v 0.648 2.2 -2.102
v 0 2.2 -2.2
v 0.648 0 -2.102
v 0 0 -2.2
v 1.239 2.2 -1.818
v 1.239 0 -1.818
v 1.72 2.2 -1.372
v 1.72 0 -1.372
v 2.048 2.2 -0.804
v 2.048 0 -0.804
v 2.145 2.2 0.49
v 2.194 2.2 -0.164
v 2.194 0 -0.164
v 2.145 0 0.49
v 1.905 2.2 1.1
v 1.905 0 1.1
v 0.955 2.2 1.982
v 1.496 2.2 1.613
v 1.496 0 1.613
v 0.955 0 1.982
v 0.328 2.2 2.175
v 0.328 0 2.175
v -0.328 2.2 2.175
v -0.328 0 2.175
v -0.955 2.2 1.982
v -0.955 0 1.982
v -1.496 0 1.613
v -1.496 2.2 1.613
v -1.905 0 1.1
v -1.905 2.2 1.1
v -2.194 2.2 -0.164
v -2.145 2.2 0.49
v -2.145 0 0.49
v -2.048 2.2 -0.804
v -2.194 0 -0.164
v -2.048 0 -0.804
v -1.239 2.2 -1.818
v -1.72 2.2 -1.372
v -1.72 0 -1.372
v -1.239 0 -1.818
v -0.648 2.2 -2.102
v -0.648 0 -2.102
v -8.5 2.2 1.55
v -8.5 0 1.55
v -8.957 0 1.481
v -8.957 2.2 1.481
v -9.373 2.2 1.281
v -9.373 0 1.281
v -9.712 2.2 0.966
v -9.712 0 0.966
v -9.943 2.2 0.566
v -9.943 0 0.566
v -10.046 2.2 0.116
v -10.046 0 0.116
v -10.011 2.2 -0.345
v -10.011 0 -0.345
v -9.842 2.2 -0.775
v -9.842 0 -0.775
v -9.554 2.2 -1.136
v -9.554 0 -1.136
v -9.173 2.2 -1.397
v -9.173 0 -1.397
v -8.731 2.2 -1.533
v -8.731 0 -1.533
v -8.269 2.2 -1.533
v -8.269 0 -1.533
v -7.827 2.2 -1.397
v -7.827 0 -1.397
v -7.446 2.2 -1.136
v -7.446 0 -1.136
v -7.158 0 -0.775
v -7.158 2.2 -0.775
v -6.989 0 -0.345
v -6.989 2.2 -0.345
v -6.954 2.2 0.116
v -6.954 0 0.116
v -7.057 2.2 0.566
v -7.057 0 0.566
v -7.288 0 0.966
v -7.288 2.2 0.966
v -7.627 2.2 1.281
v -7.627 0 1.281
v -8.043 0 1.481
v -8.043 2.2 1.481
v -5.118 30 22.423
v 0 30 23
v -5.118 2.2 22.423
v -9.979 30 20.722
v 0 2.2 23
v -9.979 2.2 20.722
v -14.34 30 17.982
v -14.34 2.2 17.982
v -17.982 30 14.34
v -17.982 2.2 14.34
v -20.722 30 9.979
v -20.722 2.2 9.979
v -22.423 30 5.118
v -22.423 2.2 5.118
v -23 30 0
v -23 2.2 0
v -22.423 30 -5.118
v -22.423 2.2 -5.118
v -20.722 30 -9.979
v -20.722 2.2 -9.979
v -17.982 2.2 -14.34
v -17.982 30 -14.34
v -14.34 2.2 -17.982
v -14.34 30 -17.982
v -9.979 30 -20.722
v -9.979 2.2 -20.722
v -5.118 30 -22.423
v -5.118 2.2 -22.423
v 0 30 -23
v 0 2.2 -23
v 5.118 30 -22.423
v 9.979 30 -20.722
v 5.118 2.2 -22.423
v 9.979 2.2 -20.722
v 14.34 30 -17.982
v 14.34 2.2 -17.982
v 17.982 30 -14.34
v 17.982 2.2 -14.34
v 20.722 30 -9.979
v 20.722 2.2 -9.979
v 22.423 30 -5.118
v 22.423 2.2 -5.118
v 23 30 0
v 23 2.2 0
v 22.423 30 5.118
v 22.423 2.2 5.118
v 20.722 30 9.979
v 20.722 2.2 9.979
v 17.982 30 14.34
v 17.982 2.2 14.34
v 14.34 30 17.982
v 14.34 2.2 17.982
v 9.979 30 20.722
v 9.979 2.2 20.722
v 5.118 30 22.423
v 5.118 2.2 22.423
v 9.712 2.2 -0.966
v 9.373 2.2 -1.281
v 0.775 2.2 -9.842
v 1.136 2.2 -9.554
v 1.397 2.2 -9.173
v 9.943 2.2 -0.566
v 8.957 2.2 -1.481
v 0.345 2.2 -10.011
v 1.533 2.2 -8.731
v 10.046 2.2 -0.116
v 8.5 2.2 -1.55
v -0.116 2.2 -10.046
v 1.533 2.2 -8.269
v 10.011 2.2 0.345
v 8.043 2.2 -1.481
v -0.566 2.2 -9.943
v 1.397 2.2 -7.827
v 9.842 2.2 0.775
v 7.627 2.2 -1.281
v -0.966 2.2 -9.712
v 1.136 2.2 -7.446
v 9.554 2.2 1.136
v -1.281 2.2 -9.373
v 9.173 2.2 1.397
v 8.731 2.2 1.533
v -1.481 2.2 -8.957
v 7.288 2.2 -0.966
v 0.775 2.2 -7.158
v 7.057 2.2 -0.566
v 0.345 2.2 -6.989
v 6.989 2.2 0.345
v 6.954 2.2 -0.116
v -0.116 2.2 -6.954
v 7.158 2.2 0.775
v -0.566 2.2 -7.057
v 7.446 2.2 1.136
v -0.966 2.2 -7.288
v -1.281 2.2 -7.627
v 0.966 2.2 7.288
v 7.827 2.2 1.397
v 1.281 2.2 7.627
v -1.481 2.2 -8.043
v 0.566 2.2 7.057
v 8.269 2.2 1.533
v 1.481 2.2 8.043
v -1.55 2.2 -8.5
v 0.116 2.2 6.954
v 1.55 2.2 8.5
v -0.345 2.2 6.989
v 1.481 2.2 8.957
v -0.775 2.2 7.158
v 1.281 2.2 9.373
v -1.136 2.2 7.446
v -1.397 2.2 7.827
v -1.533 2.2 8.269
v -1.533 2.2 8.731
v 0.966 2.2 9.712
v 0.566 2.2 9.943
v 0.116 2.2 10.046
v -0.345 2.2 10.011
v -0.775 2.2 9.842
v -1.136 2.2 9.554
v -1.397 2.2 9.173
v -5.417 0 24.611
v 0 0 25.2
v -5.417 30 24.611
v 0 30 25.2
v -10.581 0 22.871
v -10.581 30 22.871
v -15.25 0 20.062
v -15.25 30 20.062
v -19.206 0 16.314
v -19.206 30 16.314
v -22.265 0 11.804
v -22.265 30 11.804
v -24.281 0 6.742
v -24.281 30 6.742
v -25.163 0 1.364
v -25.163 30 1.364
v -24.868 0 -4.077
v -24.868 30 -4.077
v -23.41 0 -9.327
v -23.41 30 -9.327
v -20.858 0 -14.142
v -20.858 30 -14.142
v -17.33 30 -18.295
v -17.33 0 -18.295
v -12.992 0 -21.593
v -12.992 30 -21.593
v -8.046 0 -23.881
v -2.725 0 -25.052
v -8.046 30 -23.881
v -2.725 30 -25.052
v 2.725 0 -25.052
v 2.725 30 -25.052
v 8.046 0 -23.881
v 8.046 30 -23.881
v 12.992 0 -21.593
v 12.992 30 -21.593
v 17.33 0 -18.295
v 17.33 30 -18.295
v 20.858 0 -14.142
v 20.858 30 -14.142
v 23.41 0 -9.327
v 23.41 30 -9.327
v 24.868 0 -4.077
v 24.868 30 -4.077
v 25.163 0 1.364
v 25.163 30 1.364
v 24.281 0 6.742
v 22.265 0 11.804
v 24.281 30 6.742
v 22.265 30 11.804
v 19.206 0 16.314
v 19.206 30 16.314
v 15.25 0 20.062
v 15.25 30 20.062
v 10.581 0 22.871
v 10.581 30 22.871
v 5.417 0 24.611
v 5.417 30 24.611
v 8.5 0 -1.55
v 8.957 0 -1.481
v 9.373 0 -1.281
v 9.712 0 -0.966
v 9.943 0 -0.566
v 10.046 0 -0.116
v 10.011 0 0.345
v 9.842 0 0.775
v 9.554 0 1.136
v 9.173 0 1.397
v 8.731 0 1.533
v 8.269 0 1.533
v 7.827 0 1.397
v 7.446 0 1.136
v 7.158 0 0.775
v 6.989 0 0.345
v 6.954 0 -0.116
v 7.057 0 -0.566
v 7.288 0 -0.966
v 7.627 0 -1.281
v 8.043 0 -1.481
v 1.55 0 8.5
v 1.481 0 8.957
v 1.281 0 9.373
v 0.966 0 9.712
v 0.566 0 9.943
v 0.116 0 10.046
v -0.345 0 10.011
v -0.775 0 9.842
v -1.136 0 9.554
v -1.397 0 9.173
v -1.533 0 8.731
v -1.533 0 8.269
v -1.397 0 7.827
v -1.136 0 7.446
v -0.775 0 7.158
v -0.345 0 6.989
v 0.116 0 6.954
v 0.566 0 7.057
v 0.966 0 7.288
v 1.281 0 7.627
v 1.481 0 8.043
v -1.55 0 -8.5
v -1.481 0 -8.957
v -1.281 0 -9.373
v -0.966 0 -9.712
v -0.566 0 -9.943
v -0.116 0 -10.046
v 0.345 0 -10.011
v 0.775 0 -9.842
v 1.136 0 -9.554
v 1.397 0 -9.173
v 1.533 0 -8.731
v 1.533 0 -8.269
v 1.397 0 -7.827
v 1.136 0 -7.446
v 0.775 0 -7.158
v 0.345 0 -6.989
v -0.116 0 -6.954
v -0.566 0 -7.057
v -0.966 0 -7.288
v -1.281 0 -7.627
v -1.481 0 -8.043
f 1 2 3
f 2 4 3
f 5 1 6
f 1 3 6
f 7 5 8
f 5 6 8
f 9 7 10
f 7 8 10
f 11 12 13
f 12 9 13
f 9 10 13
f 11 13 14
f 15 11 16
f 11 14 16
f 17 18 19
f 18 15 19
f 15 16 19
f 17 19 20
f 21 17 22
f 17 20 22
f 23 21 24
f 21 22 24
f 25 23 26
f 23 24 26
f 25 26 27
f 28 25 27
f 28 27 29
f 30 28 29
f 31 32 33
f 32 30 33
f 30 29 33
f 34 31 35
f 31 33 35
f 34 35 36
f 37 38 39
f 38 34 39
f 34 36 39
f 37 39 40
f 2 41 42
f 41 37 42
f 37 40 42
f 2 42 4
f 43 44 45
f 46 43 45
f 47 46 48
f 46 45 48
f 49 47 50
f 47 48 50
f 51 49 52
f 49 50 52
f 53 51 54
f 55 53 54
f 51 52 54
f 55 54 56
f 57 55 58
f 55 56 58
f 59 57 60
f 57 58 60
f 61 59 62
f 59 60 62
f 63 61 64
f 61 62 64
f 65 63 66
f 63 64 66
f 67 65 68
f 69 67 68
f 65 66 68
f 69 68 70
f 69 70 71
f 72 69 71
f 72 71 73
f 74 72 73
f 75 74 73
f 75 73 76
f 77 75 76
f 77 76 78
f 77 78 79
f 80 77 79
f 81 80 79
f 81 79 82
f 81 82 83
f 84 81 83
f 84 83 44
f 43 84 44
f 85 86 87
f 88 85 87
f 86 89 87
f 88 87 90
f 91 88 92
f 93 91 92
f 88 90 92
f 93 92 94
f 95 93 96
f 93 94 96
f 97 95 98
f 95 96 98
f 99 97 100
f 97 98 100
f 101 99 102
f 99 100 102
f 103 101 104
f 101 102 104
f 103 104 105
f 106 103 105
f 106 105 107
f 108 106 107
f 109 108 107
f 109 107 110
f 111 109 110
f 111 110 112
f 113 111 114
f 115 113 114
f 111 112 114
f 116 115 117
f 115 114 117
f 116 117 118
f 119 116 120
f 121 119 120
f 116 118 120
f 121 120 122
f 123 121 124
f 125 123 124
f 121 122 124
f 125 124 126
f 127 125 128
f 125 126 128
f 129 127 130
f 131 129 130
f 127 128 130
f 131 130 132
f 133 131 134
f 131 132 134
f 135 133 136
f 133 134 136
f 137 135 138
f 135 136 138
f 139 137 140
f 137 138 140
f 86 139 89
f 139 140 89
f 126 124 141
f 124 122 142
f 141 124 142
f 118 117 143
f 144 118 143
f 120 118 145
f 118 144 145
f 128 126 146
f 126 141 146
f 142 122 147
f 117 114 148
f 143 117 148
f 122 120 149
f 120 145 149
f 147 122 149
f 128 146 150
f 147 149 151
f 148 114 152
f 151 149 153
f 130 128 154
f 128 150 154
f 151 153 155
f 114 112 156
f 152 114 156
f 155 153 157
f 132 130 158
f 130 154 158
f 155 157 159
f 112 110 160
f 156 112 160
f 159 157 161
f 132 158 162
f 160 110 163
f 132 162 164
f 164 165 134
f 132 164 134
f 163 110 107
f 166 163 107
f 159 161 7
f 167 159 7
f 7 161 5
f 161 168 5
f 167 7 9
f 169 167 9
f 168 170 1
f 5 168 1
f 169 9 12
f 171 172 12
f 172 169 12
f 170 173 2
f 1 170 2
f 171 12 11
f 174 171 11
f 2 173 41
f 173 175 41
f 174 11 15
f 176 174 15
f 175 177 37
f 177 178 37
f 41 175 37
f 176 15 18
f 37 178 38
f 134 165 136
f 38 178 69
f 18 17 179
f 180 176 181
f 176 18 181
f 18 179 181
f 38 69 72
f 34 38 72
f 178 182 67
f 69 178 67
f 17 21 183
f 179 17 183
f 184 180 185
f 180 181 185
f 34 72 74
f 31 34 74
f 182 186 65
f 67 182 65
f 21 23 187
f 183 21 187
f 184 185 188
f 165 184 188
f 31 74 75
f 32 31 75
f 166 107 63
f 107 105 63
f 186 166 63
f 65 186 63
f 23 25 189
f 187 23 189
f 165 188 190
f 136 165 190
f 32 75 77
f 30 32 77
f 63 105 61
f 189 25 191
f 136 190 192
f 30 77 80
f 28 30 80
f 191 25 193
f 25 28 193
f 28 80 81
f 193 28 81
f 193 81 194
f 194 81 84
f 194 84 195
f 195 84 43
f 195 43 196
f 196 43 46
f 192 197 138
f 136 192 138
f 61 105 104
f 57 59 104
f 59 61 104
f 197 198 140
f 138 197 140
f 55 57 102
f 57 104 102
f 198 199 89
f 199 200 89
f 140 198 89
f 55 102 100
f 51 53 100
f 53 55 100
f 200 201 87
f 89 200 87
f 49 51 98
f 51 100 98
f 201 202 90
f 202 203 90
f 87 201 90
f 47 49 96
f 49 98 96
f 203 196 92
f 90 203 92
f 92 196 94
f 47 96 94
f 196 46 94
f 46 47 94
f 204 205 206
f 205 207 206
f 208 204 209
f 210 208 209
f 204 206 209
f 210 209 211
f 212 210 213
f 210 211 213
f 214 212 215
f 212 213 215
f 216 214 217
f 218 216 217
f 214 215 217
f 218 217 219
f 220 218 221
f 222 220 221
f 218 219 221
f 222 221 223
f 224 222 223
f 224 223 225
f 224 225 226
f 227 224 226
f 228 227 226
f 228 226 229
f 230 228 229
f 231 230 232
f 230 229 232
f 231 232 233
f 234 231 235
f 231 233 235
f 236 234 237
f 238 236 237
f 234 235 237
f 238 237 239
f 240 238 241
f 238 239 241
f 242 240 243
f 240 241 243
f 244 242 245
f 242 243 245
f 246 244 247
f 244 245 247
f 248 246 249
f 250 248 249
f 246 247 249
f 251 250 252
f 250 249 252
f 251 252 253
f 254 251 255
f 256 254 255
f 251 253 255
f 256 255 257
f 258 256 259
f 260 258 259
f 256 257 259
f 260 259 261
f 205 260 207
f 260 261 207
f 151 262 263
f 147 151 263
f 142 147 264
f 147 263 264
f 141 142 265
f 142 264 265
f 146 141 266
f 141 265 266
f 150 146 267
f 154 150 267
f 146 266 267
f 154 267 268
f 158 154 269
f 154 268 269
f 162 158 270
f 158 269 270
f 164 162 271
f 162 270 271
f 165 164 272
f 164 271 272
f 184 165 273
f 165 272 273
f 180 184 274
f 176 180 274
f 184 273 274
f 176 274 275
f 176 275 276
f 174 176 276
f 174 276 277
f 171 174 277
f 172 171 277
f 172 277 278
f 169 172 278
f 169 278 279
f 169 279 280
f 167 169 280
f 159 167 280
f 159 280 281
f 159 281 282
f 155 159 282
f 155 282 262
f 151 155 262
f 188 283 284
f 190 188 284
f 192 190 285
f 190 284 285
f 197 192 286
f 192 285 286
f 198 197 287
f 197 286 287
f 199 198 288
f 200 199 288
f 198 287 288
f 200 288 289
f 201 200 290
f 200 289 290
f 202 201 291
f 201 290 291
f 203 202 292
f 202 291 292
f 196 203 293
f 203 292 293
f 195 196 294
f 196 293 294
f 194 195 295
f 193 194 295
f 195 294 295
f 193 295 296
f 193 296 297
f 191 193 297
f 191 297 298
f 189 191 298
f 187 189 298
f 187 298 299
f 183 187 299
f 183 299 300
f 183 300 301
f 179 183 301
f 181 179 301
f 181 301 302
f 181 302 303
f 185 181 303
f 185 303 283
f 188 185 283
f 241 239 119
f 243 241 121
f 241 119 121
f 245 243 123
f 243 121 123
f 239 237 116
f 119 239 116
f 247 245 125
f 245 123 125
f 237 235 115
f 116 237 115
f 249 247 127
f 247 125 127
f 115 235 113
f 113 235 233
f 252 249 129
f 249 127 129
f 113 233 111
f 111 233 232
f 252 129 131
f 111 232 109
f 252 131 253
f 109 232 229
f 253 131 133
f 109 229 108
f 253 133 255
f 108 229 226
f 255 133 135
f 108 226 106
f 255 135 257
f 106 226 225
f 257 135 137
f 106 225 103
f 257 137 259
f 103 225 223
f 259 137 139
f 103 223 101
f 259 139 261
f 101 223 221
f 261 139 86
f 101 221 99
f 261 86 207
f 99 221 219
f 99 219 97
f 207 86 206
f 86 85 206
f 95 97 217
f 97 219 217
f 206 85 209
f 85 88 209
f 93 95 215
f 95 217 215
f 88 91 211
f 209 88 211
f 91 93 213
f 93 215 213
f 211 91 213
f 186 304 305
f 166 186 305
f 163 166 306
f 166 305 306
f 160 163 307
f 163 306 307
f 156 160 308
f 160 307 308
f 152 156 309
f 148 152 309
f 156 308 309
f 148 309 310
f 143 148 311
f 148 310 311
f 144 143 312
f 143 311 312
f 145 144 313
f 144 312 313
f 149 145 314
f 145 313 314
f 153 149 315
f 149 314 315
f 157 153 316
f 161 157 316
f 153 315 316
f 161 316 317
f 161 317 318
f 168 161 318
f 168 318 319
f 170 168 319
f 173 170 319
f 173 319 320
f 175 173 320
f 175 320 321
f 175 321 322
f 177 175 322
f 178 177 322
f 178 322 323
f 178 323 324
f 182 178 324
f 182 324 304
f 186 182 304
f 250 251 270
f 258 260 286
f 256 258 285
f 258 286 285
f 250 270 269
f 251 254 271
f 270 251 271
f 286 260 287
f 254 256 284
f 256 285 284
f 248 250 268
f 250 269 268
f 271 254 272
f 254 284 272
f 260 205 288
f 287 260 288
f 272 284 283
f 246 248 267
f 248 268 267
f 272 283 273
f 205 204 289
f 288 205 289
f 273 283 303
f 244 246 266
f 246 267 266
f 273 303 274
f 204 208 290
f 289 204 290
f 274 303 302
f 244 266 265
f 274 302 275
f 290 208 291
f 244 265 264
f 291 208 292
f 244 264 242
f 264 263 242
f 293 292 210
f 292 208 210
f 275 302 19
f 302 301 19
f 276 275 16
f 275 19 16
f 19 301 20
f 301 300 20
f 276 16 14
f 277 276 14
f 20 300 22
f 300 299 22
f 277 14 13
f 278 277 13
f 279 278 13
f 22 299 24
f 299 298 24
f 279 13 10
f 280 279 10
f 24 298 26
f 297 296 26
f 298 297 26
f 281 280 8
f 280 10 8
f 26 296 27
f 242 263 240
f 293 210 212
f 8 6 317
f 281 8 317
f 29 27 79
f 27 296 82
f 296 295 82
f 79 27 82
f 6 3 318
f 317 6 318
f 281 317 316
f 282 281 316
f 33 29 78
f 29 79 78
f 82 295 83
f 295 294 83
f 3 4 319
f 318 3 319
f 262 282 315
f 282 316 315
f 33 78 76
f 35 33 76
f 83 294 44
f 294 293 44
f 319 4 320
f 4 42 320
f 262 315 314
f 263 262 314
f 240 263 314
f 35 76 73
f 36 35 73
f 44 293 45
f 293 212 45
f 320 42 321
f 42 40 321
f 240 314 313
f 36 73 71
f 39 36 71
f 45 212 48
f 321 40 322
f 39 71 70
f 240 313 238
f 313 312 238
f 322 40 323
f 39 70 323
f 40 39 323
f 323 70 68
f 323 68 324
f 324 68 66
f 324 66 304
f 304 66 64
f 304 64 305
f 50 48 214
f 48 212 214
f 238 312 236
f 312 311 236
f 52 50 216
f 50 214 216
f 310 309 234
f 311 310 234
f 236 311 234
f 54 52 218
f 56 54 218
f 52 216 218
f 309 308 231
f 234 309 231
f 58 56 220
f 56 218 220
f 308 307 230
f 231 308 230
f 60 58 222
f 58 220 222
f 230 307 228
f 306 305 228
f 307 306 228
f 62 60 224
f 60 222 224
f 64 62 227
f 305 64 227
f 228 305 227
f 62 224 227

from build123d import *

# Parameters (mm, degrees)
SKETCH_2_R               = 2.2
SKETCH_2_R_2             = 1.55
CUT_EXTRUDE_1_DEPTH      = 47.584117465
PATTERN_CIRCULAR_1_COUNT = 4


with BuildPart() as part:
    # 草图1 → 旋转1 (revolve)
    with BuildSketch(Plane.XY, mode=Mode.PRIVATE) as revolve_1_sk:
        Polygon((0, 0), (25.2, 0), (25.2, 30), (23, 30), (23, 2.2), (0, 2.2), align=None)
    revolve(revolve_1_sk.sketch.rotate(Axis((0, 2.2, 0), (0, -1, 0)), 90), axis=Axis((0, 2.2, 0), (0, -1, 0)))

    # 草图2 → 切除-拉伸1 (cut, through all)
    with BuildSketch(Plane.XZ):
        with Locations(Location((0, 0, 0), (0, 0, 270))):
            Circle(SKETCH_2_R)
        with Locations(Location((8.5, 0, 0), (0, 0, 270))):
            Circle(SKETCH_2_R_2)
    cut_extrude_1 = extrude(amount=-CUT_EXTRUDE_1_DEPTH, mode=Mode.SUBTRACT)

    # 阵列(圆周)1: 切除-拉伸1 ×4 about axis
    pattern_circular_1_axis = Axis((0, 0, 0), (0, 1, 0))
    for i in range(1, PATTERN_CIRCULAR_1_COUNT):
        add(cut_extrude_1.rotate(pattern_circular_1_axis, i * 360 / PATTERN_CIRCULAR_1_COUNT), mode=Mode.SUBTRACT)


solid = part.part
